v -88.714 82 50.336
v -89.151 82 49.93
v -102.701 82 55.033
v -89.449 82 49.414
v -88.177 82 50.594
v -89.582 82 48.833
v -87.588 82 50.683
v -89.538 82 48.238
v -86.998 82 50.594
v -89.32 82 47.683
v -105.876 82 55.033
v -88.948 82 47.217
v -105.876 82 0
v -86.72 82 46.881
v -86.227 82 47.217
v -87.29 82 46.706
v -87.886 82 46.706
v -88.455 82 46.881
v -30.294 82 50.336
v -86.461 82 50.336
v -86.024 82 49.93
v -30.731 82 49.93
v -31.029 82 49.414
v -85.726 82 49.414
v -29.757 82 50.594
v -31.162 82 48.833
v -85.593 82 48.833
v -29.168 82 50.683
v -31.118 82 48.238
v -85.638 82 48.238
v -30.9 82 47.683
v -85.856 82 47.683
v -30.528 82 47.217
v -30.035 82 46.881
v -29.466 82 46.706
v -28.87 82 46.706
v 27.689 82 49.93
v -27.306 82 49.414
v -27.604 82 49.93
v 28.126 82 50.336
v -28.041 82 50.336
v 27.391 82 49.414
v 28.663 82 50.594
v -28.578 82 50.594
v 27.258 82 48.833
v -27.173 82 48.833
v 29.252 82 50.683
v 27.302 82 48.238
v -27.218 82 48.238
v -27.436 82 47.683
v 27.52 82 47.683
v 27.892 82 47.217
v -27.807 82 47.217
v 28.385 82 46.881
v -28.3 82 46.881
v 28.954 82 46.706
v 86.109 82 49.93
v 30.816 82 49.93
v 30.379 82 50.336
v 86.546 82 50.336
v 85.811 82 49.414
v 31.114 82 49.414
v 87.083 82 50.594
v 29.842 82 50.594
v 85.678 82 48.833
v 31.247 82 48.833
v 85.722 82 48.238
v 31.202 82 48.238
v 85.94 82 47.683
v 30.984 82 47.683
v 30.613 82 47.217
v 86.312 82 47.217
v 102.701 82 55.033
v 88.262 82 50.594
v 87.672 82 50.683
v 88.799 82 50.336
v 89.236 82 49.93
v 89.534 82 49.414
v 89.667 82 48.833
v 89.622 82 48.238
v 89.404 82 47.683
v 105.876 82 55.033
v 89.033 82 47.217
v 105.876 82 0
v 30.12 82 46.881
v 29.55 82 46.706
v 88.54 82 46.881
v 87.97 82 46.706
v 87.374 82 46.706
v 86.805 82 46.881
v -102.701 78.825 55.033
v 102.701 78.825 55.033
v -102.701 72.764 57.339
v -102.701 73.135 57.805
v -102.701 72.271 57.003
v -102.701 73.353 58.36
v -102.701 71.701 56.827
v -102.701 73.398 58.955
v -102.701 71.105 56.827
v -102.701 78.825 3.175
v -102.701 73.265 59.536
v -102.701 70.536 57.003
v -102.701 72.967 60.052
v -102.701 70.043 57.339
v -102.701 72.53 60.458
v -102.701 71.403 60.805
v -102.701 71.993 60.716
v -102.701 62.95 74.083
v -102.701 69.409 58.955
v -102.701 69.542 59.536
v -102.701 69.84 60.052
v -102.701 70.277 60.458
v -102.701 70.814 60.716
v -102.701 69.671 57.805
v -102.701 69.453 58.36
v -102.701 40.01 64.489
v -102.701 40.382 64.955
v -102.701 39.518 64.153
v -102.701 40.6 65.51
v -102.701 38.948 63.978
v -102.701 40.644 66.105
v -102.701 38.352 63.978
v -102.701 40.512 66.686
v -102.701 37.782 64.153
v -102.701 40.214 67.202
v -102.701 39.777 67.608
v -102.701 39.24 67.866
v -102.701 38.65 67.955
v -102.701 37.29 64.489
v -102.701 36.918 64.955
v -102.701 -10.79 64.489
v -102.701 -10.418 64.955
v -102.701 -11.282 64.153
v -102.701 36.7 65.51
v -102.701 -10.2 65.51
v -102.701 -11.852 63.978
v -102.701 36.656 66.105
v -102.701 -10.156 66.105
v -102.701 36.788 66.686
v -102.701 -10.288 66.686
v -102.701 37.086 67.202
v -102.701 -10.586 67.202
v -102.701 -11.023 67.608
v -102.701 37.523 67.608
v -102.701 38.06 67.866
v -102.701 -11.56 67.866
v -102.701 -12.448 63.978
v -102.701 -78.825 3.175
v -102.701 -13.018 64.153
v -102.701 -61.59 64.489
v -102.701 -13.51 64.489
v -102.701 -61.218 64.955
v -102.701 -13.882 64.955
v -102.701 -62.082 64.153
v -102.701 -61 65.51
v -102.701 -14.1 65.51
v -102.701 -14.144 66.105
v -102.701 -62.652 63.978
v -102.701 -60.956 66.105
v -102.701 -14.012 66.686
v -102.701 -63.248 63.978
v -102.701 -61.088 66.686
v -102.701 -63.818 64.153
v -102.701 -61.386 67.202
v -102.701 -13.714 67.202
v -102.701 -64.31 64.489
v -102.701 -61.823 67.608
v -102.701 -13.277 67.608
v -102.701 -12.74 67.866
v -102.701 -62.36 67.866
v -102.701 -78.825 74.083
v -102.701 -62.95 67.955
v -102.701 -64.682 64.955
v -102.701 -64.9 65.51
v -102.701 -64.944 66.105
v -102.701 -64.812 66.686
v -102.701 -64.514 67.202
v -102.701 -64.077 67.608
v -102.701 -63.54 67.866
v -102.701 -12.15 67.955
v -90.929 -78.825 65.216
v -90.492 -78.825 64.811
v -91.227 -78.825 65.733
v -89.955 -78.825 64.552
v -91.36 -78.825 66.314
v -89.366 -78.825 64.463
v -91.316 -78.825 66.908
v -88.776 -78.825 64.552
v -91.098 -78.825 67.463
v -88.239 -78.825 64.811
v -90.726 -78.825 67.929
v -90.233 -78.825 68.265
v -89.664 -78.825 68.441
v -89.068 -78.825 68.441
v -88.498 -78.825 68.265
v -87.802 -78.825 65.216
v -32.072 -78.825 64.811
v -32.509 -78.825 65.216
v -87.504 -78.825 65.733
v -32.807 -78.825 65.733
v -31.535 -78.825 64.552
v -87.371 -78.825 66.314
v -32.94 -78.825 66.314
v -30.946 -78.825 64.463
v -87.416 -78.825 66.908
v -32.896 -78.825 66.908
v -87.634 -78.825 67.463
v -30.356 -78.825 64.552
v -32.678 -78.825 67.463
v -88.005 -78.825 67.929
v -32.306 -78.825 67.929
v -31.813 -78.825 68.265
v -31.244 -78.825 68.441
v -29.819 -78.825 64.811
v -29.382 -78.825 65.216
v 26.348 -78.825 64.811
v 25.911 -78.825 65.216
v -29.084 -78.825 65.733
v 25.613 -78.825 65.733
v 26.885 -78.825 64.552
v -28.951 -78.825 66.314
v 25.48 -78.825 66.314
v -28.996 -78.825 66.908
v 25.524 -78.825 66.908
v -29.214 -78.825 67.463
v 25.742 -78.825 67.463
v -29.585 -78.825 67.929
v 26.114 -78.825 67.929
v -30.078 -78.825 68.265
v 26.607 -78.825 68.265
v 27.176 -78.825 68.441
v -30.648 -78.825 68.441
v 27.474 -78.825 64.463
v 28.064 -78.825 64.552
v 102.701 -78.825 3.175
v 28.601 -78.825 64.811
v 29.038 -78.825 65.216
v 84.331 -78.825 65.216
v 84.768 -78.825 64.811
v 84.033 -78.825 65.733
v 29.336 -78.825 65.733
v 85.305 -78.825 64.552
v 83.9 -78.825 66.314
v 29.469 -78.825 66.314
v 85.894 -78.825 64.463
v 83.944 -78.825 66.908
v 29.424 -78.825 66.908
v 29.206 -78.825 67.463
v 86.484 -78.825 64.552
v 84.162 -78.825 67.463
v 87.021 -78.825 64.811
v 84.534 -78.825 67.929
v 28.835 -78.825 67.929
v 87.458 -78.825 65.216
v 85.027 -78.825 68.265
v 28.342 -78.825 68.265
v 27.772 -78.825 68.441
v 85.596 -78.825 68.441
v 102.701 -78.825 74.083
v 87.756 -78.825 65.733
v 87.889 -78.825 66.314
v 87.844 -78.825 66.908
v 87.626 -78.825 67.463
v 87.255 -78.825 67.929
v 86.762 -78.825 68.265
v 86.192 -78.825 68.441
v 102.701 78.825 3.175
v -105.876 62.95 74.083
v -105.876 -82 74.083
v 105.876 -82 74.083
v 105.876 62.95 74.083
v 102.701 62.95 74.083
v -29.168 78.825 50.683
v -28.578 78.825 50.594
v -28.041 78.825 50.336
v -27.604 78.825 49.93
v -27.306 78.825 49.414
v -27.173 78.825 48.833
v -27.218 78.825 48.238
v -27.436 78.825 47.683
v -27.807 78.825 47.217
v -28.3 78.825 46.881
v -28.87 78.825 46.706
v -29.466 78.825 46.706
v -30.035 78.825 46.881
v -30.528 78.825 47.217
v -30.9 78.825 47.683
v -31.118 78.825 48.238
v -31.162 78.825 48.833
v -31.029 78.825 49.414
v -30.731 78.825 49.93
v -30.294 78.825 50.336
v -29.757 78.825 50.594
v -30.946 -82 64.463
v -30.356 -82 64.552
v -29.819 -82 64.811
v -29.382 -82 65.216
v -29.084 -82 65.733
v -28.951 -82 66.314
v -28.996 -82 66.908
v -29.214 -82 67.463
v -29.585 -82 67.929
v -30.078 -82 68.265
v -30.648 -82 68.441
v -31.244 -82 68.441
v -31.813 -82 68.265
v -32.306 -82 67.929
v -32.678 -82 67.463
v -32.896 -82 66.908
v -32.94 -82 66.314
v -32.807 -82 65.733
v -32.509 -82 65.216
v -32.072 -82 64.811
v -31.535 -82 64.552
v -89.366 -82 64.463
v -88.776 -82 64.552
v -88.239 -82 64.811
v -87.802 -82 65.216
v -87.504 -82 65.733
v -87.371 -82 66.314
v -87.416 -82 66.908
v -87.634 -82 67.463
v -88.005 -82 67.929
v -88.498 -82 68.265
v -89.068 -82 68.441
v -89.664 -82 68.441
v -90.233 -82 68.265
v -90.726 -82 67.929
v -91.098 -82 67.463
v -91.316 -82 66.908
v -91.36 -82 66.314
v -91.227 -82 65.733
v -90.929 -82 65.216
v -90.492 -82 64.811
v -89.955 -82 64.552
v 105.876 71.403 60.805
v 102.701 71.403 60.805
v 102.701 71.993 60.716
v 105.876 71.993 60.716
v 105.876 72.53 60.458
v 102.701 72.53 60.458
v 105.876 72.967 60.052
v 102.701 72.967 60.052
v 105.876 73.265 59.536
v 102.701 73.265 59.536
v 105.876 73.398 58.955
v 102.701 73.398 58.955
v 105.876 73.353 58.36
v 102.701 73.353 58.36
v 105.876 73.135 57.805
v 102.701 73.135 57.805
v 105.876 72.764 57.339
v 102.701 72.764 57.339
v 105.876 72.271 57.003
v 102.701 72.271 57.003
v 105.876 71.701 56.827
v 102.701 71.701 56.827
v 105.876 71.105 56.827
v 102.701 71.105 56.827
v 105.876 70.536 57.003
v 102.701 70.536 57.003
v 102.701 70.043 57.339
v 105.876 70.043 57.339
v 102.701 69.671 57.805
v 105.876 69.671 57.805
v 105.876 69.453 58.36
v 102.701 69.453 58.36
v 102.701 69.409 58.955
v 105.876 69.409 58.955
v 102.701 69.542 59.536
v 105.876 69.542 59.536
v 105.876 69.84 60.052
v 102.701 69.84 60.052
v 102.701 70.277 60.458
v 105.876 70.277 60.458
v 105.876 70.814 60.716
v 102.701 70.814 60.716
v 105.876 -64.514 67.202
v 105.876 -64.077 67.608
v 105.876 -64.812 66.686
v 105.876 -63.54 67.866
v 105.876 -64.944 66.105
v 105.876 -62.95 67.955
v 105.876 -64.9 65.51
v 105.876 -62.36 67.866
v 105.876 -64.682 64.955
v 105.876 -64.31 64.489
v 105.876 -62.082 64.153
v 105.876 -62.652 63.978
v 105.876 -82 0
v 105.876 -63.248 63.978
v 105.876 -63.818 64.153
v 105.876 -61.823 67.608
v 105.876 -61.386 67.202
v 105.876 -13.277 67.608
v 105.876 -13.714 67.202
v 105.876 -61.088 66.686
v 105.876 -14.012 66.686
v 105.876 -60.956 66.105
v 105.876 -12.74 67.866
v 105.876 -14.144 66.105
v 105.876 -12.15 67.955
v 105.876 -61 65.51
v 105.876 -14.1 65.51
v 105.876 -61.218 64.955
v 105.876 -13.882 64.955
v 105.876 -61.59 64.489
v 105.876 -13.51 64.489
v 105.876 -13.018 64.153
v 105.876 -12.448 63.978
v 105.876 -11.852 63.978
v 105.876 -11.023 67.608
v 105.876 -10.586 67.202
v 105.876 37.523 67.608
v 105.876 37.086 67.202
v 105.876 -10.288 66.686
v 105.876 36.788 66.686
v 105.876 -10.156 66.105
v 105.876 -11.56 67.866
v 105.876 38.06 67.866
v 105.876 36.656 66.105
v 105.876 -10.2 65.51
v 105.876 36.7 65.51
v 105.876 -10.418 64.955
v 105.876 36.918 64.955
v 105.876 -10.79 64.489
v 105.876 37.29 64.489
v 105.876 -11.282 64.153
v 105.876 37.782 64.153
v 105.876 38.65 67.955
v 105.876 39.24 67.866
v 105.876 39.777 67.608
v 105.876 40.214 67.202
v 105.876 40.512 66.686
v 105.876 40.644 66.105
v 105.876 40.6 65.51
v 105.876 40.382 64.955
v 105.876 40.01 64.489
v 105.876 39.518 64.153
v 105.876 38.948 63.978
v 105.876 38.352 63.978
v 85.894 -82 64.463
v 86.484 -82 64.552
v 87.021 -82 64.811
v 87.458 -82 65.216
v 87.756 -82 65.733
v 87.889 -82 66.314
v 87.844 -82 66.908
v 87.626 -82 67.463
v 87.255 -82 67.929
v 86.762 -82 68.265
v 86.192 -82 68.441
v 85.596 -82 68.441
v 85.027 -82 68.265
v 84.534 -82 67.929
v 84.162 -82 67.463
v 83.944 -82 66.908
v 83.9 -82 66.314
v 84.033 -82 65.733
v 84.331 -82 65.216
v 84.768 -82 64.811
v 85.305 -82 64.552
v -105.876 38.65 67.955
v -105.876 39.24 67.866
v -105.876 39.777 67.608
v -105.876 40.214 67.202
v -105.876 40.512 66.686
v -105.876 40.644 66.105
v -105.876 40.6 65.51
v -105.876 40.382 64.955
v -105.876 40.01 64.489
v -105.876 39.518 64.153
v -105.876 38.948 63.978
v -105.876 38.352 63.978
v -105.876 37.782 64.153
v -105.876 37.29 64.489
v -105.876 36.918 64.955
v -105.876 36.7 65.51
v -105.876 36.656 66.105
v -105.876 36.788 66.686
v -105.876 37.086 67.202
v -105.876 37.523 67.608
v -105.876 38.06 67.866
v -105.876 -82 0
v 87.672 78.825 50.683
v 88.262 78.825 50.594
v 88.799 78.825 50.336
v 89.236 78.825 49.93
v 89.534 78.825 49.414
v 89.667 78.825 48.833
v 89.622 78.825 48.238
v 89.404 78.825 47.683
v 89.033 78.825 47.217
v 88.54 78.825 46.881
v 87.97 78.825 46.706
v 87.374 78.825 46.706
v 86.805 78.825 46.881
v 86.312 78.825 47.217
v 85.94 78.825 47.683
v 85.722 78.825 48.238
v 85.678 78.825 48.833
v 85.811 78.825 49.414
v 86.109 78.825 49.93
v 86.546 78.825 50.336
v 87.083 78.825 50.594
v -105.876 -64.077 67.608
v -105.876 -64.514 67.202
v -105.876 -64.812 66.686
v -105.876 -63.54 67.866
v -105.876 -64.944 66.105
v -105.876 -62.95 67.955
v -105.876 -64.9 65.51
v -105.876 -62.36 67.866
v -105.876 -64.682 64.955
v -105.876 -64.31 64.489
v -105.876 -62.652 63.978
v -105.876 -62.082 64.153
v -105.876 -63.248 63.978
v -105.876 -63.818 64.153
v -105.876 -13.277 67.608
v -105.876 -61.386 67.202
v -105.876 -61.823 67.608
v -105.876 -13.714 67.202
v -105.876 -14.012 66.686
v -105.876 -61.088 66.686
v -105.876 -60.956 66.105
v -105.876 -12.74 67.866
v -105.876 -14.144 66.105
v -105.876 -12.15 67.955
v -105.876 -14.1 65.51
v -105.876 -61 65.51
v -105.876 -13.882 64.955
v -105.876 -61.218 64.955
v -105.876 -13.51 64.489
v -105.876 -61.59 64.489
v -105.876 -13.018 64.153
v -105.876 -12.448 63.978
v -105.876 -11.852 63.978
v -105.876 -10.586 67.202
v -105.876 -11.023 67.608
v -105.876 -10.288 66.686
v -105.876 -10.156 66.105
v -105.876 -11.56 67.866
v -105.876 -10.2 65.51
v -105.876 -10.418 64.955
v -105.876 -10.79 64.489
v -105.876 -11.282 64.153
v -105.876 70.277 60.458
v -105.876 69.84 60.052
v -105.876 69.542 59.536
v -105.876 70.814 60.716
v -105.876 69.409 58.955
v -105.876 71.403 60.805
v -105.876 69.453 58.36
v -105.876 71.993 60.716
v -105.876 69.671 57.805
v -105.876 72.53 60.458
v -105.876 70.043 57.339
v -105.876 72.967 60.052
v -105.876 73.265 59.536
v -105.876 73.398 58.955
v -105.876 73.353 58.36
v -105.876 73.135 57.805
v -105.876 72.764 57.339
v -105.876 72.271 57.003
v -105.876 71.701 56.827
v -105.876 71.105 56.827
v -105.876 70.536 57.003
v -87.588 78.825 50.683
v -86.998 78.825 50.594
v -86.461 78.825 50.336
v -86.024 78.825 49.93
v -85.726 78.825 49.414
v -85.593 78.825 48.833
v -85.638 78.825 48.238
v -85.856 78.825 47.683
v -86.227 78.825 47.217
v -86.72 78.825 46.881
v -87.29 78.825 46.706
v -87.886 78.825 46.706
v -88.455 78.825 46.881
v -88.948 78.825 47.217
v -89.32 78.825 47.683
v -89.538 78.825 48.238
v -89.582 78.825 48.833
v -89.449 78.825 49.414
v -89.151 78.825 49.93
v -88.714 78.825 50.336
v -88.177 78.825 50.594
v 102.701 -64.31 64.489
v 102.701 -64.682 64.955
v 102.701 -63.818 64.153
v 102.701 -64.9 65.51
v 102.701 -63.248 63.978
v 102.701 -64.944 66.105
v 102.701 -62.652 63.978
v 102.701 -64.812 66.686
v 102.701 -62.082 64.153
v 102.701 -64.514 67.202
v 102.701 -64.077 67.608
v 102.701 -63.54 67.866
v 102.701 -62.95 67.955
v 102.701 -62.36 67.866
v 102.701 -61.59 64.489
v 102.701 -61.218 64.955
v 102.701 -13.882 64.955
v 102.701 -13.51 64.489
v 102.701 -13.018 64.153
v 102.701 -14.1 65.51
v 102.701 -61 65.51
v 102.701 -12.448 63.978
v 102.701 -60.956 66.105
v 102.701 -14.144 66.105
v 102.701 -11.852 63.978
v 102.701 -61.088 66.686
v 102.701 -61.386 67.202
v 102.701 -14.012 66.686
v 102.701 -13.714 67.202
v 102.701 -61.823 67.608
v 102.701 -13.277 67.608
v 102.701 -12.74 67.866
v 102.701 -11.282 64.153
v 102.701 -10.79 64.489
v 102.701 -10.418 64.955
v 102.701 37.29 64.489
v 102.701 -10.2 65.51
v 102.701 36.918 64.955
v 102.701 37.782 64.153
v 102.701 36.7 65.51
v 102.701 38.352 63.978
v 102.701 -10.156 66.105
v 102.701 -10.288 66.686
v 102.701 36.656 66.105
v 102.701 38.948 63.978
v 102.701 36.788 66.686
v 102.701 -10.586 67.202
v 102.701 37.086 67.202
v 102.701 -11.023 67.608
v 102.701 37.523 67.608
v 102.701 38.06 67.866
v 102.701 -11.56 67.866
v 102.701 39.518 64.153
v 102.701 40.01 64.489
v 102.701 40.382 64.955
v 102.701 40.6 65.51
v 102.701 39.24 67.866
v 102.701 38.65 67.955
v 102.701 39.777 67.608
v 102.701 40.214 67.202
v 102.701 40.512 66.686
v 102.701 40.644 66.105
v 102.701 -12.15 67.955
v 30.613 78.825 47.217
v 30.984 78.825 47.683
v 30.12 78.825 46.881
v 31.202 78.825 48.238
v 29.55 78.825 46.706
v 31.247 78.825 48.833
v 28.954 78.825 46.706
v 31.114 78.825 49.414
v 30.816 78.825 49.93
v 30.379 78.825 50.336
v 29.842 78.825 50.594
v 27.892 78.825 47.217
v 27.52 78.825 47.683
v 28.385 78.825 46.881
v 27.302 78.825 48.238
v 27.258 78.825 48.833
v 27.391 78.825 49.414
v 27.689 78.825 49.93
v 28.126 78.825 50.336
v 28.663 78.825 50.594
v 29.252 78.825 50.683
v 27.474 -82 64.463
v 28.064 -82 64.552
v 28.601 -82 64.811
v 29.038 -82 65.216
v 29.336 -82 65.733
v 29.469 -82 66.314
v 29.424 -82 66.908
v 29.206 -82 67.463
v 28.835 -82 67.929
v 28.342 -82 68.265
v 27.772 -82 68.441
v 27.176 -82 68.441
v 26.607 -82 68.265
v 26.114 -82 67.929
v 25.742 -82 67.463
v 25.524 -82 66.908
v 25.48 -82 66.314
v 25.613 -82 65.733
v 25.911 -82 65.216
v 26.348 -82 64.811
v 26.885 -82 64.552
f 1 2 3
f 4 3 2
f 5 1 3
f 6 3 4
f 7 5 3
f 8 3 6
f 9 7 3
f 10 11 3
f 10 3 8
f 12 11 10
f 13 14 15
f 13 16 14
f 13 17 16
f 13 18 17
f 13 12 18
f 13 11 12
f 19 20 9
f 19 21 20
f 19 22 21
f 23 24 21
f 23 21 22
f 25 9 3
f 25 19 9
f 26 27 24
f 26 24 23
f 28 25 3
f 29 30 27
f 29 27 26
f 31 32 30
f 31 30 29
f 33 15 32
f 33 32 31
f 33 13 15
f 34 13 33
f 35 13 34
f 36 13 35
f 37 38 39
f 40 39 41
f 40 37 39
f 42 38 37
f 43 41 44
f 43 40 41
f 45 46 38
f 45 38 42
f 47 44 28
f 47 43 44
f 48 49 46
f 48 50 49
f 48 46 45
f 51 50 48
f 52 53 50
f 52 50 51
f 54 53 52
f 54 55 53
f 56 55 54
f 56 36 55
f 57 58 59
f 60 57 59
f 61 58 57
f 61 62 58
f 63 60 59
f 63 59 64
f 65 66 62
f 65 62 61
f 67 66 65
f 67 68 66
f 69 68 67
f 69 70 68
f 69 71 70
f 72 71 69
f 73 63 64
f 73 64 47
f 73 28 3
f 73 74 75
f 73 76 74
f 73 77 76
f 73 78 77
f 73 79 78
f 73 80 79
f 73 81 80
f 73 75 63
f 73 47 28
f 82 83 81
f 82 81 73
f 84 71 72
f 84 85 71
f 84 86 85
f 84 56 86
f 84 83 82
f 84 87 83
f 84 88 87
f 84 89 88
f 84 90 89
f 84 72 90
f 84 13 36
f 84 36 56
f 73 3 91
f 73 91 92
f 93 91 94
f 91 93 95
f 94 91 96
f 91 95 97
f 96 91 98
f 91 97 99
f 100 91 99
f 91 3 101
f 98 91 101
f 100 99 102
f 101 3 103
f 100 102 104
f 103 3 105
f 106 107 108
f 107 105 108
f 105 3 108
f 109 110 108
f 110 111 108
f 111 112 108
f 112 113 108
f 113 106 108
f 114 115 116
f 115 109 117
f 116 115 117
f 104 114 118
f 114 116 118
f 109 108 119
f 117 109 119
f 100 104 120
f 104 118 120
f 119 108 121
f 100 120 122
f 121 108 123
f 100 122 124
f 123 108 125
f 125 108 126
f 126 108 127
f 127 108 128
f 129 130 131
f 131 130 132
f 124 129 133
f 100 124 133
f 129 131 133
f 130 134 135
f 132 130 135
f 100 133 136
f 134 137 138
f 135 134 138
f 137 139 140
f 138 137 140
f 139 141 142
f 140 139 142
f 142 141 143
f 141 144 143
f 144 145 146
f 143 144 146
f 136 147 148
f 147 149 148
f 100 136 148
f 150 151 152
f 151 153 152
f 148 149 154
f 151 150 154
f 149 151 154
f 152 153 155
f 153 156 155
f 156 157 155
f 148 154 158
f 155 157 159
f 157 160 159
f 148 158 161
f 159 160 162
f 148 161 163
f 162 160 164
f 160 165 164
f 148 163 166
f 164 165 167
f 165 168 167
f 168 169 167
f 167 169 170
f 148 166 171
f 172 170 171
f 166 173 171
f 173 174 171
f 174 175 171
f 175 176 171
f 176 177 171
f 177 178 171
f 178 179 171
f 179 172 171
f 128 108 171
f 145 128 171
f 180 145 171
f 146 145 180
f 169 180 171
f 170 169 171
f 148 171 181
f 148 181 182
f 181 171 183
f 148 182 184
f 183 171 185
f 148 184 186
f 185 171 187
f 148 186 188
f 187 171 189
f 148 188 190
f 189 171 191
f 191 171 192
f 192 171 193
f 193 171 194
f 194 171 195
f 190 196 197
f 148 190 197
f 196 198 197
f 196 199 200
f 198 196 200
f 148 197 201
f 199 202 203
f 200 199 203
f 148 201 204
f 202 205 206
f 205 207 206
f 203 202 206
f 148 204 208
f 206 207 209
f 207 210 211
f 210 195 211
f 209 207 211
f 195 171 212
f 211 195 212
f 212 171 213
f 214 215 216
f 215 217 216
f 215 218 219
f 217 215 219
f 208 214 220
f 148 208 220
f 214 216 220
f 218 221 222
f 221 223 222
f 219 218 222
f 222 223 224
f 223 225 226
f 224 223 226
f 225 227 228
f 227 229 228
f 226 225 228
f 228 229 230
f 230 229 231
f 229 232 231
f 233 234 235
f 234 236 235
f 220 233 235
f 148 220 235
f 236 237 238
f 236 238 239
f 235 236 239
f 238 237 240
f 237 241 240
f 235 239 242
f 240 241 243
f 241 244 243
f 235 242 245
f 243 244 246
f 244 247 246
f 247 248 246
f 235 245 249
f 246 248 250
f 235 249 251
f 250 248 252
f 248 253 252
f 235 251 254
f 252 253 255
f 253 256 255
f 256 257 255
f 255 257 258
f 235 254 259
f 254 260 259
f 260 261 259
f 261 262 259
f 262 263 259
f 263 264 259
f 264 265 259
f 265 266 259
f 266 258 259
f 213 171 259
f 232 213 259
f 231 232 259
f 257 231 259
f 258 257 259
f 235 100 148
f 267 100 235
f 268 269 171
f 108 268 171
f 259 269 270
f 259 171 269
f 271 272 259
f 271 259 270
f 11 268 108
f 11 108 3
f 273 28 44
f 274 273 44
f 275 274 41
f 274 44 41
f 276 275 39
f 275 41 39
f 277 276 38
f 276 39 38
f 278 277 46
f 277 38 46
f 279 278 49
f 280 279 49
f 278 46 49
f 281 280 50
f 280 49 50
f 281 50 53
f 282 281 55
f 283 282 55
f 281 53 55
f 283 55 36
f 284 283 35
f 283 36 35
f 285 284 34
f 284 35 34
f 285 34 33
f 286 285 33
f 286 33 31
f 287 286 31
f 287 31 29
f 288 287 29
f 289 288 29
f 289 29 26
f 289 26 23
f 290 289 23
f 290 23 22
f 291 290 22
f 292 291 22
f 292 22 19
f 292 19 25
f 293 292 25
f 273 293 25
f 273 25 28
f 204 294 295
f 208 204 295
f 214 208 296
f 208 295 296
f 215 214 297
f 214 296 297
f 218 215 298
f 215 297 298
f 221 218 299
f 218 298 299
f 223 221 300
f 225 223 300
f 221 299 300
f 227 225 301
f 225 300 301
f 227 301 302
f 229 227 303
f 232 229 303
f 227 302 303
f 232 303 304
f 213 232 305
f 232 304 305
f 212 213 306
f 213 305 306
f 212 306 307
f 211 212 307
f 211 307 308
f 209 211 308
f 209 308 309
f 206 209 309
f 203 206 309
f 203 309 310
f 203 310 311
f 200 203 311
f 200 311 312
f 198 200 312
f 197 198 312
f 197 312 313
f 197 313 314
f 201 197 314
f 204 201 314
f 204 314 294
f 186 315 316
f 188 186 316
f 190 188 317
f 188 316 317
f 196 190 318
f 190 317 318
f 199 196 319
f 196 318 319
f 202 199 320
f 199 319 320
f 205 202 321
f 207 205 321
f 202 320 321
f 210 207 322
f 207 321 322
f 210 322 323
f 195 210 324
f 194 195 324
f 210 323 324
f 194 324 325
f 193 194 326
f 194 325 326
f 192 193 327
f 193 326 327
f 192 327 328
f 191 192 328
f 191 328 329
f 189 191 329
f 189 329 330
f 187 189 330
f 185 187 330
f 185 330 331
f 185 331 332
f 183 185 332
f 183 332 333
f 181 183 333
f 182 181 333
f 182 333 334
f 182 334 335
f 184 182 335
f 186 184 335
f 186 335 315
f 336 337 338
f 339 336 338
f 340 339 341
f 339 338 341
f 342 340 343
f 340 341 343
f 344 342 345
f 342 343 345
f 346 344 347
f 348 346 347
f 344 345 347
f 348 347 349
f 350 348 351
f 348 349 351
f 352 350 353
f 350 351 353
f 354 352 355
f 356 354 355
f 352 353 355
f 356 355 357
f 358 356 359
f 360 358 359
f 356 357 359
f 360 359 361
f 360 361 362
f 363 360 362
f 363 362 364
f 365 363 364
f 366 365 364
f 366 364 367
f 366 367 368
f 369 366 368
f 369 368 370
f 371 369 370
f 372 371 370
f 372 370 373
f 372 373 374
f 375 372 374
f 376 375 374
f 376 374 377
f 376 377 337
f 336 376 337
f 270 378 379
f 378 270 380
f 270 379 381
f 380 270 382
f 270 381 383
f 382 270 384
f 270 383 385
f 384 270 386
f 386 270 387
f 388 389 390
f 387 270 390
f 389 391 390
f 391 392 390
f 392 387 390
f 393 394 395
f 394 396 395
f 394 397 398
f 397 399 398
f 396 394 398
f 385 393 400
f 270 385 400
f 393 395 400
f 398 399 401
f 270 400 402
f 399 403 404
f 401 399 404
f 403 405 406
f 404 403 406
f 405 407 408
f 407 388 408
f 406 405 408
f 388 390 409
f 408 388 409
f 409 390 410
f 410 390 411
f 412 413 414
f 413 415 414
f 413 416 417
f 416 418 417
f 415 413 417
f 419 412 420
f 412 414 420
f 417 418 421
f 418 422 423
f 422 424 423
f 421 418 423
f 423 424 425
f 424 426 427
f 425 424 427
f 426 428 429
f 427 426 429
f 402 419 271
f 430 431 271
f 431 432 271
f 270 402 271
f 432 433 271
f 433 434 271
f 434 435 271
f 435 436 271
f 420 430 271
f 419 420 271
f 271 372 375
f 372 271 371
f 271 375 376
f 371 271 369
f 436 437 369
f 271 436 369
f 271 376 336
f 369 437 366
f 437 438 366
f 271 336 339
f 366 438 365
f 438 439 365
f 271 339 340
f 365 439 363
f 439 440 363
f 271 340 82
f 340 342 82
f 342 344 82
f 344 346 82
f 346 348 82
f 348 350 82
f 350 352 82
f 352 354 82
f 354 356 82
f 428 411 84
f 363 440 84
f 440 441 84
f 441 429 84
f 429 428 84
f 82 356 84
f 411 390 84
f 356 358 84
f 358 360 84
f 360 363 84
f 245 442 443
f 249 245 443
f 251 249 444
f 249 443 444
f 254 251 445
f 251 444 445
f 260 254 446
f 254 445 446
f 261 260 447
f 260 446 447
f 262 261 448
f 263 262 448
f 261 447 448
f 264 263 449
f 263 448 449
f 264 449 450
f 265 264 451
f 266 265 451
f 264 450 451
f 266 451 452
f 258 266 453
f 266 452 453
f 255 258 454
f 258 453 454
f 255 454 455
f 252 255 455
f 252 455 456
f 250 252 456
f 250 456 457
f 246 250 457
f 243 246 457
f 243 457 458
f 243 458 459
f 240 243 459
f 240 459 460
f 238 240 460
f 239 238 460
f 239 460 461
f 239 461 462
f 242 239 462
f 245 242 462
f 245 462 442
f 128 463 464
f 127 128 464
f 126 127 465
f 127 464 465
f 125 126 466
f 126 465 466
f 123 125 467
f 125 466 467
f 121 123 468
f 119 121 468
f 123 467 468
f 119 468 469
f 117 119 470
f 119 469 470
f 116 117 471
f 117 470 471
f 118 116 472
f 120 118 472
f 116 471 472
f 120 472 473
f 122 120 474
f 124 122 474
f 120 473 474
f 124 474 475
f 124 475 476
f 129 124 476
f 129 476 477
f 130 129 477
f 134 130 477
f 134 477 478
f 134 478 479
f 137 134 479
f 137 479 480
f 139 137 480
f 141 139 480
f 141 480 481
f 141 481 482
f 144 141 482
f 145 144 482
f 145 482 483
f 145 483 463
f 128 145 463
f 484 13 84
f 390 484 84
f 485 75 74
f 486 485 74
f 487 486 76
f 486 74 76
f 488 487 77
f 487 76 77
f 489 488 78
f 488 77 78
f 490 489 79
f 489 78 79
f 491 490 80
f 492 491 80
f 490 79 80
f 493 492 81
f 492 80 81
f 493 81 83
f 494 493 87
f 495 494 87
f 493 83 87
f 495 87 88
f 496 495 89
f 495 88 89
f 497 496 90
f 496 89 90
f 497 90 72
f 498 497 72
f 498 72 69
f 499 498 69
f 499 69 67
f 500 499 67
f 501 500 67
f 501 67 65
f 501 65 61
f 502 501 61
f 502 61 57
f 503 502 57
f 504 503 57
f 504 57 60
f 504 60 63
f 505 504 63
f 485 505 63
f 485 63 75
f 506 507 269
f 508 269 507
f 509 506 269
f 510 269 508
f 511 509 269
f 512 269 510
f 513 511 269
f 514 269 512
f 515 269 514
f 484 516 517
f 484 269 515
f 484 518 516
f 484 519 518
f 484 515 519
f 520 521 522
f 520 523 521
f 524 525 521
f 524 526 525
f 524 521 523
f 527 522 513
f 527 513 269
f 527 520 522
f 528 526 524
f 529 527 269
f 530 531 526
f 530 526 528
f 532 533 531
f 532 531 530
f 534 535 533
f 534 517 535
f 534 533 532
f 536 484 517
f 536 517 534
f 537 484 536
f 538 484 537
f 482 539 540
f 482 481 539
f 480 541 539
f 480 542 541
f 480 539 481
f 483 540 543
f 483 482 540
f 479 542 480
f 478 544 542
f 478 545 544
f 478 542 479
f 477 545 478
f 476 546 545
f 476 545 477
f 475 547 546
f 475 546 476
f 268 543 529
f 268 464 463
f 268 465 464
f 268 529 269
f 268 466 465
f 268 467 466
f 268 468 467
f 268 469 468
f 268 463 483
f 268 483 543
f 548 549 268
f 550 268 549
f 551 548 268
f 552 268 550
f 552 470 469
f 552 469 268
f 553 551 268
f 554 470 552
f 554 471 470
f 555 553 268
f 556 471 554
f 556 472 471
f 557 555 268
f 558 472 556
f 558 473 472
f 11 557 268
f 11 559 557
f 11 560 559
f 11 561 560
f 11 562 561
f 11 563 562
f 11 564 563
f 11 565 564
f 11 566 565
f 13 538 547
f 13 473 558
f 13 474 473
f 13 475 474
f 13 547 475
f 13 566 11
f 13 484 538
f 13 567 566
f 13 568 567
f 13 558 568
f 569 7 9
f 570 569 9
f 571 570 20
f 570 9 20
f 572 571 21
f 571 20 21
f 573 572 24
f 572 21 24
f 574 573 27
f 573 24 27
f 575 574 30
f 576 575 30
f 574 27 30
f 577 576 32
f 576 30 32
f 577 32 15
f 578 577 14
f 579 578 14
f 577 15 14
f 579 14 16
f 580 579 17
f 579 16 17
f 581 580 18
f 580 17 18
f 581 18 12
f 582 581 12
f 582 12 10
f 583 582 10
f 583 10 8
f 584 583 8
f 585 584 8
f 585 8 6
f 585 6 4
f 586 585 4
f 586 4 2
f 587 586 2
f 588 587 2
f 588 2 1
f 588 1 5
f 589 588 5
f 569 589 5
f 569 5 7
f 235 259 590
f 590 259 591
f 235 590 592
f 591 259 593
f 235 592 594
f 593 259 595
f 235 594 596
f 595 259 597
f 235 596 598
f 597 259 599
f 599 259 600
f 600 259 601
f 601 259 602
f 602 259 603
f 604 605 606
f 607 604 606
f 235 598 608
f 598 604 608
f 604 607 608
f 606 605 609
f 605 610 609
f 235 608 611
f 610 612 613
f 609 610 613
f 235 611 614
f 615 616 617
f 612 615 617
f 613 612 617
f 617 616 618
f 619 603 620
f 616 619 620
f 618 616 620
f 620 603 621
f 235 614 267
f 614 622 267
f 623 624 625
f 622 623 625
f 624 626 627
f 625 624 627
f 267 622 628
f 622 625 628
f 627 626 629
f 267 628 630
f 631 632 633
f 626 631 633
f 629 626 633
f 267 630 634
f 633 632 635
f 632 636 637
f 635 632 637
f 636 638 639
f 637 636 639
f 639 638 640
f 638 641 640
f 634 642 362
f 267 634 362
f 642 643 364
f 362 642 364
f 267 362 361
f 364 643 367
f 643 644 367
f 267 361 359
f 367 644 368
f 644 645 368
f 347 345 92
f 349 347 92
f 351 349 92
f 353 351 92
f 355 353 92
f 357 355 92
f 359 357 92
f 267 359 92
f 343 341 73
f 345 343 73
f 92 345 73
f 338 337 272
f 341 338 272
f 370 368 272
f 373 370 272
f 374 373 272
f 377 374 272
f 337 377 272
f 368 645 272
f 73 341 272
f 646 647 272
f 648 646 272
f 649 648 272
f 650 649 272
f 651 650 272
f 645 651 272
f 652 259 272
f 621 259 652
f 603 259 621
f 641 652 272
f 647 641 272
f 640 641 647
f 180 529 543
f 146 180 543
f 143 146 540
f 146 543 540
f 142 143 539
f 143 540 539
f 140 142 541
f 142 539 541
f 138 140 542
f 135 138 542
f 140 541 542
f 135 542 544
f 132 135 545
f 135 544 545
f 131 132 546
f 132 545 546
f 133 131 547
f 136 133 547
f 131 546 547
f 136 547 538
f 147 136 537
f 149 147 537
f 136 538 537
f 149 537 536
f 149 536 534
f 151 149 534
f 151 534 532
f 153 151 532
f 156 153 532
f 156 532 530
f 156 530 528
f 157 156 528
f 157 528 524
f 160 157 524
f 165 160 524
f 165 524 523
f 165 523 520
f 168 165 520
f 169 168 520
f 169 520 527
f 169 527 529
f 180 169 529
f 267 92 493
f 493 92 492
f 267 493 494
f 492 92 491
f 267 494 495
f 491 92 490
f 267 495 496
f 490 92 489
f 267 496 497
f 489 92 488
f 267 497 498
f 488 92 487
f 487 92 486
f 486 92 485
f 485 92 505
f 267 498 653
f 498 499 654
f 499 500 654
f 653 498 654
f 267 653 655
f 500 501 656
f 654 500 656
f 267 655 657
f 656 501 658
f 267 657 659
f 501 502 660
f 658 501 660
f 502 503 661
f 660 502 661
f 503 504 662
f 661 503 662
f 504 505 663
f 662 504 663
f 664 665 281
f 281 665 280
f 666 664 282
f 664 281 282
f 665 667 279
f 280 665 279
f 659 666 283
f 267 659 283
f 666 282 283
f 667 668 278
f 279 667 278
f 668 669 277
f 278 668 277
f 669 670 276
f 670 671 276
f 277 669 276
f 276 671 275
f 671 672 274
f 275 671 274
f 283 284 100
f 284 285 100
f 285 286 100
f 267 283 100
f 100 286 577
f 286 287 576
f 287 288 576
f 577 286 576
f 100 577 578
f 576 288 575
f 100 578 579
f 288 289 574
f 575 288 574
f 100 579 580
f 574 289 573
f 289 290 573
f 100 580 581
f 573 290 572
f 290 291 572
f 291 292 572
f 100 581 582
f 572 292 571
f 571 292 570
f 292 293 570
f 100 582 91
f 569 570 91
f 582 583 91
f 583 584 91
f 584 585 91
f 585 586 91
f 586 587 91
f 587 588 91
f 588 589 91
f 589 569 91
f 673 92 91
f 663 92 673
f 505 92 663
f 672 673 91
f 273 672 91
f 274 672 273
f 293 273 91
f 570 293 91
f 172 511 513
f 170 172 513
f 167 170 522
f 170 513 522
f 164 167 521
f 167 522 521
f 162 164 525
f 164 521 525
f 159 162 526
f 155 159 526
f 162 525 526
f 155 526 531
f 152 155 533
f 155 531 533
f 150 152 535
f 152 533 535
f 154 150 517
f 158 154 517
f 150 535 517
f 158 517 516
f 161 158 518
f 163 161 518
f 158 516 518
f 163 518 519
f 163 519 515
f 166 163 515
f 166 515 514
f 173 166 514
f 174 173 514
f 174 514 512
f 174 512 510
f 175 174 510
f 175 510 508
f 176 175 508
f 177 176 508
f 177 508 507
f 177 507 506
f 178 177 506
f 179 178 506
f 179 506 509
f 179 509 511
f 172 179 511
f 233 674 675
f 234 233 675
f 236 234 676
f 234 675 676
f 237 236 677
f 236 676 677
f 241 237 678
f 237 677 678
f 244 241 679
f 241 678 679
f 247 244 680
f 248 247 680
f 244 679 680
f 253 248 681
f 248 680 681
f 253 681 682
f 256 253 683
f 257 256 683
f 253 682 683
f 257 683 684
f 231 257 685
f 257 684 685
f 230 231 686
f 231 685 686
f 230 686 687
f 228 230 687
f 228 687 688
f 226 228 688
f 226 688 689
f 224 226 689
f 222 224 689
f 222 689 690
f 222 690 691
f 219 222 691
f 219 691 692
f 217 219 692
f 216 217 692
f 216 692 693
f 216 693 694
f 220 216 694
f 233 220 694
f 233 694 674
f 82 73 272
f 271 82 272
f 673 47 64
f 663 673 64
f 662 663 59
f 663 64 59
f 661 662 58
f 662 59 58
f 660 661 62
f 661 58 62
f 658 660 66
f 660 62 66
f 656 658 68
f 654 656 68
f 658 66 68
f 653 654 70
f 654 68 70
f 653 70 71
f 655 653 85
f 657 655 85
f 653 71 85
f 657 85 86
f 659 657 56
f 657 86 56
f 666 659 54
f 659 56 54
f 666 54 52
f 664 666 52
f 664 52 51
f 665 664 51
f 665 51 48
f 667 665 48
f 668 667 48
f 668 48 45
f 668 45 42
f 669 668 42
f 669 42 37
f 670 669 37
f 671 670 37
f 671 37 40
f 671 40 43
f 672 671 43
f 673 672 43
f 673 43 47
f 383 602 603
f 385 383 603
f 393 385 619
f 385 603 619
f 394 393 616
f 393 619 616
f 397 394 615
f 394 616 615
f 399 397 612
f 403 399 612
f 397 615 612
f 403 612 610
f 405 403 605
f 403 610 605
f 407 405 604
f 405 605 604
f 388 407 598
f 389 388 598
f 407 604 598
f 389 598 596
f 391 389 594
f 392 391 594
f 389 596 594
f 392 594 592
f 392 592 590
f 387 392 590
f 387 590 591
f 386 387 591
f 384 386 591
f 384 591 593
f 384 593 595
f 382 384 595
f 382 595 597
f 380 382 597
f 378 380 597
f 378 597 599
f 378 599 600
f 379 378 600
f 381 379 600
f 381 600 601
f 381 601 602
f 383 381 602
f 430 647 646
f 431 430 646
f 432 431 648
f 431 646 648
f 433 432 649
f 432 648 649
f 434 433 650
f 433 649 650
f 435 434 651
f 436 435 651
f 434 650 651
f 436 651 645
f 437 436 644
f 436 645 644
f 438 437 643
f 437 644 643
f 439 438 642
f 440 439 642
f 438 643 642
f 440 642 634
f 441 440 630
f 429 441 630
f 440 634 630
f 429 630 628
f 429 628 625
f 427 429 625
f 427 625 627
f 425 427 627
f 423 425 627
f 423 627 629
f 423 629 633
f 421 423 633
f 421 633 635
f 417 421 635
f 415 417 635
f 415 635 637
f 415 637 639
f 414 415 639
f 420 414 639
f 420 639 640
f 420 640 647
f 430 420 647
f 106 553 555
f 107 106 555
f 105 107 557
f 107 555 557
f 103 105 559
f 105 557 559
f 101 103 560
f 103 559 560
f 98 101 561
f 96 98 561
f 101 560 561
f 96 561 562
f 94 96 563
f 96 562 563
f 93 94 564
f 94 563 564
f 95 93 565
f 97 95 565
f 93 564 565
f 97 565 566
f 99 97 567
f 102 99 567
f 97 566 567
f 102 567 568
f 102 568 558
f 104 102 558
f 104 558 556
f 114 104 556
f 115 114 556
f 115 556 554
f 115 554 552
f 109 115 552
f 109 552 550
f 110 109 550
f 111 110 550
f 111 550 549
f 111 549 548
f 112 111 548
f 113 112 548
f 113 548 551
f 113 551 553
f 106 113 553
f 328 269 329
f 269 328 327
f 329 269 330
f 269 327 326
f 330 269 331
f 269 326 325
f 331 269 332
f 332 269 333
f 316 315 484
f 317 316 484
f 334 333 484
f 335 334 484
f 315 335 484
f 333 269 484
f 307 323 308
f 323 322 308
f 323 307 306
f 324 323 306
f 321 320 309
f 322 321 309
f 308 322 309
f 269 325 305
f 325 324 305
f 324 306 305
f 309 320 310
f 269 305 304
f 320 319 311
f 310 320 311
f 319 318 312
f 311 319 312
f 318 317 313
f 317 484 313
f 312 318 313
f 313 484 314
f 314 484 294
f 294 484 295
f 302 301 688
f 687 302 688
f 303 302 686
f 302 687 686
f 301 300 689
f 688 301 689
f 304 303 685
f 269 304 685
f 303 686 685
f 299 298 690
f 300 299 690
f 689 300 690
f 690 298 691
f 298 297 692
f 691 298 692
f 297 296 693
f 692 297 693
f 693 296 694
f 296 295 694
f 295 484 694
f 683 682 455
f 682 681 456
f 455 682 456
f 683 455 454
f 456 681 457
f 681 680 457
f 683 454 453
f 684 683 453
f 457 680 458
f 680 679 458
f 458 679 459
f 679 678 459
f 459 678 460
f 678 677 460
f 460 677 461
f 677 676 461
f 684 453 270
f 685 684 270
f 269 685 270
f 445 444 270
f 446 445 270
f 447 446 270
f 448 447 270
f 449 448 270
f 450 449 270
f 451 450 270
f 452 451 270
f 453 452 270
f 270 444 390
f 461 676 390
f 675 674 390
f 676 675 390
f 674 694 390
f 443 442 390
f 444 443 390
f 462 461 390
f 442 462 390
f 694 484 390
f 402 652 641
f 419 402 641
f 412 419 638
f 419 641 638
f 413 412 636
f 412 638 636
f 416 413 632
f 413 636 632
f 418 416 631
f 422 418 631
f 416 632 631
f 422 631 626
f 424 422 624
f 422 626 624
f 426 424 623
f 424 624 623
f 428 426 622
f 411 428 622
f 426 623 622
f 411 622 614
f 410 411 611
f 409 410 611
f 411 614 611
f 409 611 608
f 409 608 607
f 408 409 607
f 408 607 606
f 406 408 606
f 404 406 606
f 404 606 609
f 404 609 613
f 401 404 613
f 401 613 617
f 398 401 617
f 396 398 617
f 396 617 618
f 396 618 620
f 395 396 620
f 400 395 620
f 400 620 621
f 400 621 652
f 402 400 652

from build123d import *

# Parameters (mm, degrees)
SKETCH2_W                = 211.751333334
SKETCH2_H                = 164
BOSS_EXTRUDE1_DEPTH      = 74.083333333
CUT_EXTRUDE7_DEPTH       = 70.90833333
CUT_EXTRUDE9_REACH       = 240.853
CUT_EXTRUDE10_DEPTH      = 3.175
SKETCH14_W               = 205.401333334
SKETCH14_H               = 3.175
CUT_EXTRUDE11_DEPTH      = 3.175
CUT_EXTRUDE12_DEPTH      = 239.853443446
CUT_EXTRUDE12_DEPTH_BACK = 3.175
SKETCH16_R               = 2
CUT_EXTRUDE13_DEPTH      = 239.853443446
LPATTERN1_COUNT          = 3
LPATTERN1_PITCH          = 50.8
CUT_EXTRUDE14_REACH      = 210.792
SKETCH18_R               = 2
LPATTERN2_COUNT          = 4
LPATTERN2_PITCH          = 58.42
CUT_EXTRUDE15_REACH      = 210.792
SKETCH19_R               = 2
LPATTERN3_COUNT          = 4
LPATTERN3_PITCH          = 58.42
SKETCH20_R               = 2
CUT_EXTRUDE16_DEPTH      = 239.853443446


with BuildPart() as part:
    # Sketch2 → Boss-Extrude1 (new body)
    with BuildSketch(Plane.XY):
        Rectangle(SKETCH2_W, SKETCH2_H)
    extrude(amount=BOSS_EXTRUDE1_DEPTH)

    # Sketch9 → Cut-Extrude7 (cut)
    with BuildSketch(Plane.XY.offset(74.083333333)):
        Polygon((-102.700666667, 62.95), (-102.700666667, -47.748173381), (-102.700666667, -78.825), (-61.266487403, -78.825), (102.700666667, -78.825), (102.700666667, -21.962957065), (102.700666667, 78.825), (-87.76182231, 78.825), (-102.700666667, 78.825), align=None)
    extrude(amount=-CUT_EXTRUDE7_DEPTH, mode=Mode.SUBTRACT)

    # Sketch11 → Cut-Extrude9 (cut, up to next)
    with BuildSketch(Plane.ZY.offset(105.875666667), mode=Mode.PRIVATE) as cut_extrude9_sk1:
        Polygon((58.208333333, 78.825), (74.083333333, 62.95), (74.083333333, 82), (58.208333333, 82), (58.208333333, 79.62382388), align=None)
    cut_extrude9_tool1 = extrude(cut_extrude9_sk1.sketch, amount=-CUT_EXTRUDE9_REACH, mode=Mode.PRIVATE) & part.part
    add(cut_extrude9_tool1.solids().sort_by_distance((-105.875667, 75.49881, 68.035714))[0], mode=Mode.SUBTRACT)

    # Sketch13 → Cut-Extrude10 (cut)
    with BuildSketch(Plane.ZY.offset(105.875666667)):
        Polygon((58.208333333, 78.825), (55.033333333, 82), (58.208333333, 82), align=None)
    extrude(amount=-CUT_EXTRUDE10_DEPTH, mode=Mode.SUBTRACT)

    # Sketch14 → Cut-Extrude11 (cut)
    with BuildSketch(Plane.XY.offset(58.208333333)):
        with Locations((0, 80.4125)):
            Rectangle(SKETCH14_W, SKETCH14_H)
    extrude(amount=-CUT_EXTRUDE11_DEPTH, mode=Mode.SUBTRACT)

    # Sketch15 → Cut-Extrude12 (cut, two sides: drawn at the far end of the back side and taken through both)
    with BuildSketch(Plane(origin=(105.875666667, 0, 0), x_dir=(0, 0, -1), z_dir=(1, 0, 0)).offset(-CUT_EXTRUDE12_DEPTH_BACK)):
        Polygon((-58.208333333, 79.215720039), (-58.208333333, 78.825), (-55.033333333, 82), (-58.208333333, 82), align=None)
    extrude(amount=CUT_EXTRUDE12_DEPTH + CUT_EXTRUDE12_DEPTH_BACK, mode=Mode.SUBTRACT)

    # Sketch16 → Cut-Extrude13 (cut, through all)
    with BuildSketch(Plane.ZY.offset(105.875666667)):
        with Locations((65.955333333, -62.95)):
            Circle(SKETCH16_R)
    cut_extrude13 = extrude(amount=-CUT_EXTRUDE13_DEPTH, mode=Mode.SUBTRACT)

    # LPattern1: Cut-Extrude13 ×3
    with Locations(*[(0, i * LPATTERN1_PITCH, 0) for i in range(1, LPATTERN1_COUNT)]):
        add(cut_extrude13, mode=Mode.SUBTRACT)

    # Sketch18 → Cut-Extrude14 (cut, up to next)
    with BuildSketch(Plane.XZ.offset(82), mode=Mode.PRIVATE) as cut_extrude14_sk1:
        with Locations(Location((-89.365666667, 66.463333333, 0), (0, 0, 270))):
            Circle(SKETCH18_R)
    cut_extrude14_tool1 = extrude(cut_extrude14_sk1.sketch, amount=-CUT_EXTRUDE14_REACH, mode=Mode.PRIVATE) & part.part
    cut_extrude14 = cut_extrude14_tool1.solids().sort_by_distance((-89.365667, -82, 66.463333))[0]
    add(cut_extrude14, mode=Mode.SUBTRACT)

    # LPattern2: Cut-Extrude14 ×4
    with Locations(*[(i * LPATTERN2_PITCH, 0, 0) for i in range(1, LPATTERN2_COUNT)]):
        add(cut_extrude14, mode=Mode.SUBTRACT)

    # Sketch19 → Cut-Extrude15 (cut, up to next)
    with BuildSketch(Plane(origin=(0, 82, 0), x_dir=(1, 0, 0), z_dir=(0, 1, 0)), mode=Mode.PRIVATE) as cut_extrude15_sk1:
        with Locations(Location((-87.587666667, -48.683333333, 0), (0, 0, 270))):
            Circle(SKETCH19_R)
    cut_extrude15_tool1 = extrude(cut_extrude15_sk1.sketch, amount=-CUT_EXTRUDE15_REACH, mode=Mode.PRIVATE) & part.part
    cut_extrude15 = cut_extrude15_tool1.solids().sort_by_distance((-87.587667, 82, 48.683333))[0]
    add(cut_extrude15, mode=Mode.SUBTRACT)

    # LPattern3: Cut-Extrude15 ×4
    with Locations(*[(i * LPATTERN3_PITCH, 0, 0) for i in range(1, LPATTERN3_COUNT)]):
        add(cut_extrude15, mode=Mode.SUBTRACT)

    # Sketch20 → Cut-Extrude16 (cut, through all)
    with BuildSketch(Plane.ZY.offset(105.875666667)):
        with Locations((58.805040904, 71.403297777)):
            Circle(SKETCH20_R)
    extrude(amount=-CUT_EXTRUDE16_DEPTH, mode=Mode.SUBTRACT)


solid = part.part
